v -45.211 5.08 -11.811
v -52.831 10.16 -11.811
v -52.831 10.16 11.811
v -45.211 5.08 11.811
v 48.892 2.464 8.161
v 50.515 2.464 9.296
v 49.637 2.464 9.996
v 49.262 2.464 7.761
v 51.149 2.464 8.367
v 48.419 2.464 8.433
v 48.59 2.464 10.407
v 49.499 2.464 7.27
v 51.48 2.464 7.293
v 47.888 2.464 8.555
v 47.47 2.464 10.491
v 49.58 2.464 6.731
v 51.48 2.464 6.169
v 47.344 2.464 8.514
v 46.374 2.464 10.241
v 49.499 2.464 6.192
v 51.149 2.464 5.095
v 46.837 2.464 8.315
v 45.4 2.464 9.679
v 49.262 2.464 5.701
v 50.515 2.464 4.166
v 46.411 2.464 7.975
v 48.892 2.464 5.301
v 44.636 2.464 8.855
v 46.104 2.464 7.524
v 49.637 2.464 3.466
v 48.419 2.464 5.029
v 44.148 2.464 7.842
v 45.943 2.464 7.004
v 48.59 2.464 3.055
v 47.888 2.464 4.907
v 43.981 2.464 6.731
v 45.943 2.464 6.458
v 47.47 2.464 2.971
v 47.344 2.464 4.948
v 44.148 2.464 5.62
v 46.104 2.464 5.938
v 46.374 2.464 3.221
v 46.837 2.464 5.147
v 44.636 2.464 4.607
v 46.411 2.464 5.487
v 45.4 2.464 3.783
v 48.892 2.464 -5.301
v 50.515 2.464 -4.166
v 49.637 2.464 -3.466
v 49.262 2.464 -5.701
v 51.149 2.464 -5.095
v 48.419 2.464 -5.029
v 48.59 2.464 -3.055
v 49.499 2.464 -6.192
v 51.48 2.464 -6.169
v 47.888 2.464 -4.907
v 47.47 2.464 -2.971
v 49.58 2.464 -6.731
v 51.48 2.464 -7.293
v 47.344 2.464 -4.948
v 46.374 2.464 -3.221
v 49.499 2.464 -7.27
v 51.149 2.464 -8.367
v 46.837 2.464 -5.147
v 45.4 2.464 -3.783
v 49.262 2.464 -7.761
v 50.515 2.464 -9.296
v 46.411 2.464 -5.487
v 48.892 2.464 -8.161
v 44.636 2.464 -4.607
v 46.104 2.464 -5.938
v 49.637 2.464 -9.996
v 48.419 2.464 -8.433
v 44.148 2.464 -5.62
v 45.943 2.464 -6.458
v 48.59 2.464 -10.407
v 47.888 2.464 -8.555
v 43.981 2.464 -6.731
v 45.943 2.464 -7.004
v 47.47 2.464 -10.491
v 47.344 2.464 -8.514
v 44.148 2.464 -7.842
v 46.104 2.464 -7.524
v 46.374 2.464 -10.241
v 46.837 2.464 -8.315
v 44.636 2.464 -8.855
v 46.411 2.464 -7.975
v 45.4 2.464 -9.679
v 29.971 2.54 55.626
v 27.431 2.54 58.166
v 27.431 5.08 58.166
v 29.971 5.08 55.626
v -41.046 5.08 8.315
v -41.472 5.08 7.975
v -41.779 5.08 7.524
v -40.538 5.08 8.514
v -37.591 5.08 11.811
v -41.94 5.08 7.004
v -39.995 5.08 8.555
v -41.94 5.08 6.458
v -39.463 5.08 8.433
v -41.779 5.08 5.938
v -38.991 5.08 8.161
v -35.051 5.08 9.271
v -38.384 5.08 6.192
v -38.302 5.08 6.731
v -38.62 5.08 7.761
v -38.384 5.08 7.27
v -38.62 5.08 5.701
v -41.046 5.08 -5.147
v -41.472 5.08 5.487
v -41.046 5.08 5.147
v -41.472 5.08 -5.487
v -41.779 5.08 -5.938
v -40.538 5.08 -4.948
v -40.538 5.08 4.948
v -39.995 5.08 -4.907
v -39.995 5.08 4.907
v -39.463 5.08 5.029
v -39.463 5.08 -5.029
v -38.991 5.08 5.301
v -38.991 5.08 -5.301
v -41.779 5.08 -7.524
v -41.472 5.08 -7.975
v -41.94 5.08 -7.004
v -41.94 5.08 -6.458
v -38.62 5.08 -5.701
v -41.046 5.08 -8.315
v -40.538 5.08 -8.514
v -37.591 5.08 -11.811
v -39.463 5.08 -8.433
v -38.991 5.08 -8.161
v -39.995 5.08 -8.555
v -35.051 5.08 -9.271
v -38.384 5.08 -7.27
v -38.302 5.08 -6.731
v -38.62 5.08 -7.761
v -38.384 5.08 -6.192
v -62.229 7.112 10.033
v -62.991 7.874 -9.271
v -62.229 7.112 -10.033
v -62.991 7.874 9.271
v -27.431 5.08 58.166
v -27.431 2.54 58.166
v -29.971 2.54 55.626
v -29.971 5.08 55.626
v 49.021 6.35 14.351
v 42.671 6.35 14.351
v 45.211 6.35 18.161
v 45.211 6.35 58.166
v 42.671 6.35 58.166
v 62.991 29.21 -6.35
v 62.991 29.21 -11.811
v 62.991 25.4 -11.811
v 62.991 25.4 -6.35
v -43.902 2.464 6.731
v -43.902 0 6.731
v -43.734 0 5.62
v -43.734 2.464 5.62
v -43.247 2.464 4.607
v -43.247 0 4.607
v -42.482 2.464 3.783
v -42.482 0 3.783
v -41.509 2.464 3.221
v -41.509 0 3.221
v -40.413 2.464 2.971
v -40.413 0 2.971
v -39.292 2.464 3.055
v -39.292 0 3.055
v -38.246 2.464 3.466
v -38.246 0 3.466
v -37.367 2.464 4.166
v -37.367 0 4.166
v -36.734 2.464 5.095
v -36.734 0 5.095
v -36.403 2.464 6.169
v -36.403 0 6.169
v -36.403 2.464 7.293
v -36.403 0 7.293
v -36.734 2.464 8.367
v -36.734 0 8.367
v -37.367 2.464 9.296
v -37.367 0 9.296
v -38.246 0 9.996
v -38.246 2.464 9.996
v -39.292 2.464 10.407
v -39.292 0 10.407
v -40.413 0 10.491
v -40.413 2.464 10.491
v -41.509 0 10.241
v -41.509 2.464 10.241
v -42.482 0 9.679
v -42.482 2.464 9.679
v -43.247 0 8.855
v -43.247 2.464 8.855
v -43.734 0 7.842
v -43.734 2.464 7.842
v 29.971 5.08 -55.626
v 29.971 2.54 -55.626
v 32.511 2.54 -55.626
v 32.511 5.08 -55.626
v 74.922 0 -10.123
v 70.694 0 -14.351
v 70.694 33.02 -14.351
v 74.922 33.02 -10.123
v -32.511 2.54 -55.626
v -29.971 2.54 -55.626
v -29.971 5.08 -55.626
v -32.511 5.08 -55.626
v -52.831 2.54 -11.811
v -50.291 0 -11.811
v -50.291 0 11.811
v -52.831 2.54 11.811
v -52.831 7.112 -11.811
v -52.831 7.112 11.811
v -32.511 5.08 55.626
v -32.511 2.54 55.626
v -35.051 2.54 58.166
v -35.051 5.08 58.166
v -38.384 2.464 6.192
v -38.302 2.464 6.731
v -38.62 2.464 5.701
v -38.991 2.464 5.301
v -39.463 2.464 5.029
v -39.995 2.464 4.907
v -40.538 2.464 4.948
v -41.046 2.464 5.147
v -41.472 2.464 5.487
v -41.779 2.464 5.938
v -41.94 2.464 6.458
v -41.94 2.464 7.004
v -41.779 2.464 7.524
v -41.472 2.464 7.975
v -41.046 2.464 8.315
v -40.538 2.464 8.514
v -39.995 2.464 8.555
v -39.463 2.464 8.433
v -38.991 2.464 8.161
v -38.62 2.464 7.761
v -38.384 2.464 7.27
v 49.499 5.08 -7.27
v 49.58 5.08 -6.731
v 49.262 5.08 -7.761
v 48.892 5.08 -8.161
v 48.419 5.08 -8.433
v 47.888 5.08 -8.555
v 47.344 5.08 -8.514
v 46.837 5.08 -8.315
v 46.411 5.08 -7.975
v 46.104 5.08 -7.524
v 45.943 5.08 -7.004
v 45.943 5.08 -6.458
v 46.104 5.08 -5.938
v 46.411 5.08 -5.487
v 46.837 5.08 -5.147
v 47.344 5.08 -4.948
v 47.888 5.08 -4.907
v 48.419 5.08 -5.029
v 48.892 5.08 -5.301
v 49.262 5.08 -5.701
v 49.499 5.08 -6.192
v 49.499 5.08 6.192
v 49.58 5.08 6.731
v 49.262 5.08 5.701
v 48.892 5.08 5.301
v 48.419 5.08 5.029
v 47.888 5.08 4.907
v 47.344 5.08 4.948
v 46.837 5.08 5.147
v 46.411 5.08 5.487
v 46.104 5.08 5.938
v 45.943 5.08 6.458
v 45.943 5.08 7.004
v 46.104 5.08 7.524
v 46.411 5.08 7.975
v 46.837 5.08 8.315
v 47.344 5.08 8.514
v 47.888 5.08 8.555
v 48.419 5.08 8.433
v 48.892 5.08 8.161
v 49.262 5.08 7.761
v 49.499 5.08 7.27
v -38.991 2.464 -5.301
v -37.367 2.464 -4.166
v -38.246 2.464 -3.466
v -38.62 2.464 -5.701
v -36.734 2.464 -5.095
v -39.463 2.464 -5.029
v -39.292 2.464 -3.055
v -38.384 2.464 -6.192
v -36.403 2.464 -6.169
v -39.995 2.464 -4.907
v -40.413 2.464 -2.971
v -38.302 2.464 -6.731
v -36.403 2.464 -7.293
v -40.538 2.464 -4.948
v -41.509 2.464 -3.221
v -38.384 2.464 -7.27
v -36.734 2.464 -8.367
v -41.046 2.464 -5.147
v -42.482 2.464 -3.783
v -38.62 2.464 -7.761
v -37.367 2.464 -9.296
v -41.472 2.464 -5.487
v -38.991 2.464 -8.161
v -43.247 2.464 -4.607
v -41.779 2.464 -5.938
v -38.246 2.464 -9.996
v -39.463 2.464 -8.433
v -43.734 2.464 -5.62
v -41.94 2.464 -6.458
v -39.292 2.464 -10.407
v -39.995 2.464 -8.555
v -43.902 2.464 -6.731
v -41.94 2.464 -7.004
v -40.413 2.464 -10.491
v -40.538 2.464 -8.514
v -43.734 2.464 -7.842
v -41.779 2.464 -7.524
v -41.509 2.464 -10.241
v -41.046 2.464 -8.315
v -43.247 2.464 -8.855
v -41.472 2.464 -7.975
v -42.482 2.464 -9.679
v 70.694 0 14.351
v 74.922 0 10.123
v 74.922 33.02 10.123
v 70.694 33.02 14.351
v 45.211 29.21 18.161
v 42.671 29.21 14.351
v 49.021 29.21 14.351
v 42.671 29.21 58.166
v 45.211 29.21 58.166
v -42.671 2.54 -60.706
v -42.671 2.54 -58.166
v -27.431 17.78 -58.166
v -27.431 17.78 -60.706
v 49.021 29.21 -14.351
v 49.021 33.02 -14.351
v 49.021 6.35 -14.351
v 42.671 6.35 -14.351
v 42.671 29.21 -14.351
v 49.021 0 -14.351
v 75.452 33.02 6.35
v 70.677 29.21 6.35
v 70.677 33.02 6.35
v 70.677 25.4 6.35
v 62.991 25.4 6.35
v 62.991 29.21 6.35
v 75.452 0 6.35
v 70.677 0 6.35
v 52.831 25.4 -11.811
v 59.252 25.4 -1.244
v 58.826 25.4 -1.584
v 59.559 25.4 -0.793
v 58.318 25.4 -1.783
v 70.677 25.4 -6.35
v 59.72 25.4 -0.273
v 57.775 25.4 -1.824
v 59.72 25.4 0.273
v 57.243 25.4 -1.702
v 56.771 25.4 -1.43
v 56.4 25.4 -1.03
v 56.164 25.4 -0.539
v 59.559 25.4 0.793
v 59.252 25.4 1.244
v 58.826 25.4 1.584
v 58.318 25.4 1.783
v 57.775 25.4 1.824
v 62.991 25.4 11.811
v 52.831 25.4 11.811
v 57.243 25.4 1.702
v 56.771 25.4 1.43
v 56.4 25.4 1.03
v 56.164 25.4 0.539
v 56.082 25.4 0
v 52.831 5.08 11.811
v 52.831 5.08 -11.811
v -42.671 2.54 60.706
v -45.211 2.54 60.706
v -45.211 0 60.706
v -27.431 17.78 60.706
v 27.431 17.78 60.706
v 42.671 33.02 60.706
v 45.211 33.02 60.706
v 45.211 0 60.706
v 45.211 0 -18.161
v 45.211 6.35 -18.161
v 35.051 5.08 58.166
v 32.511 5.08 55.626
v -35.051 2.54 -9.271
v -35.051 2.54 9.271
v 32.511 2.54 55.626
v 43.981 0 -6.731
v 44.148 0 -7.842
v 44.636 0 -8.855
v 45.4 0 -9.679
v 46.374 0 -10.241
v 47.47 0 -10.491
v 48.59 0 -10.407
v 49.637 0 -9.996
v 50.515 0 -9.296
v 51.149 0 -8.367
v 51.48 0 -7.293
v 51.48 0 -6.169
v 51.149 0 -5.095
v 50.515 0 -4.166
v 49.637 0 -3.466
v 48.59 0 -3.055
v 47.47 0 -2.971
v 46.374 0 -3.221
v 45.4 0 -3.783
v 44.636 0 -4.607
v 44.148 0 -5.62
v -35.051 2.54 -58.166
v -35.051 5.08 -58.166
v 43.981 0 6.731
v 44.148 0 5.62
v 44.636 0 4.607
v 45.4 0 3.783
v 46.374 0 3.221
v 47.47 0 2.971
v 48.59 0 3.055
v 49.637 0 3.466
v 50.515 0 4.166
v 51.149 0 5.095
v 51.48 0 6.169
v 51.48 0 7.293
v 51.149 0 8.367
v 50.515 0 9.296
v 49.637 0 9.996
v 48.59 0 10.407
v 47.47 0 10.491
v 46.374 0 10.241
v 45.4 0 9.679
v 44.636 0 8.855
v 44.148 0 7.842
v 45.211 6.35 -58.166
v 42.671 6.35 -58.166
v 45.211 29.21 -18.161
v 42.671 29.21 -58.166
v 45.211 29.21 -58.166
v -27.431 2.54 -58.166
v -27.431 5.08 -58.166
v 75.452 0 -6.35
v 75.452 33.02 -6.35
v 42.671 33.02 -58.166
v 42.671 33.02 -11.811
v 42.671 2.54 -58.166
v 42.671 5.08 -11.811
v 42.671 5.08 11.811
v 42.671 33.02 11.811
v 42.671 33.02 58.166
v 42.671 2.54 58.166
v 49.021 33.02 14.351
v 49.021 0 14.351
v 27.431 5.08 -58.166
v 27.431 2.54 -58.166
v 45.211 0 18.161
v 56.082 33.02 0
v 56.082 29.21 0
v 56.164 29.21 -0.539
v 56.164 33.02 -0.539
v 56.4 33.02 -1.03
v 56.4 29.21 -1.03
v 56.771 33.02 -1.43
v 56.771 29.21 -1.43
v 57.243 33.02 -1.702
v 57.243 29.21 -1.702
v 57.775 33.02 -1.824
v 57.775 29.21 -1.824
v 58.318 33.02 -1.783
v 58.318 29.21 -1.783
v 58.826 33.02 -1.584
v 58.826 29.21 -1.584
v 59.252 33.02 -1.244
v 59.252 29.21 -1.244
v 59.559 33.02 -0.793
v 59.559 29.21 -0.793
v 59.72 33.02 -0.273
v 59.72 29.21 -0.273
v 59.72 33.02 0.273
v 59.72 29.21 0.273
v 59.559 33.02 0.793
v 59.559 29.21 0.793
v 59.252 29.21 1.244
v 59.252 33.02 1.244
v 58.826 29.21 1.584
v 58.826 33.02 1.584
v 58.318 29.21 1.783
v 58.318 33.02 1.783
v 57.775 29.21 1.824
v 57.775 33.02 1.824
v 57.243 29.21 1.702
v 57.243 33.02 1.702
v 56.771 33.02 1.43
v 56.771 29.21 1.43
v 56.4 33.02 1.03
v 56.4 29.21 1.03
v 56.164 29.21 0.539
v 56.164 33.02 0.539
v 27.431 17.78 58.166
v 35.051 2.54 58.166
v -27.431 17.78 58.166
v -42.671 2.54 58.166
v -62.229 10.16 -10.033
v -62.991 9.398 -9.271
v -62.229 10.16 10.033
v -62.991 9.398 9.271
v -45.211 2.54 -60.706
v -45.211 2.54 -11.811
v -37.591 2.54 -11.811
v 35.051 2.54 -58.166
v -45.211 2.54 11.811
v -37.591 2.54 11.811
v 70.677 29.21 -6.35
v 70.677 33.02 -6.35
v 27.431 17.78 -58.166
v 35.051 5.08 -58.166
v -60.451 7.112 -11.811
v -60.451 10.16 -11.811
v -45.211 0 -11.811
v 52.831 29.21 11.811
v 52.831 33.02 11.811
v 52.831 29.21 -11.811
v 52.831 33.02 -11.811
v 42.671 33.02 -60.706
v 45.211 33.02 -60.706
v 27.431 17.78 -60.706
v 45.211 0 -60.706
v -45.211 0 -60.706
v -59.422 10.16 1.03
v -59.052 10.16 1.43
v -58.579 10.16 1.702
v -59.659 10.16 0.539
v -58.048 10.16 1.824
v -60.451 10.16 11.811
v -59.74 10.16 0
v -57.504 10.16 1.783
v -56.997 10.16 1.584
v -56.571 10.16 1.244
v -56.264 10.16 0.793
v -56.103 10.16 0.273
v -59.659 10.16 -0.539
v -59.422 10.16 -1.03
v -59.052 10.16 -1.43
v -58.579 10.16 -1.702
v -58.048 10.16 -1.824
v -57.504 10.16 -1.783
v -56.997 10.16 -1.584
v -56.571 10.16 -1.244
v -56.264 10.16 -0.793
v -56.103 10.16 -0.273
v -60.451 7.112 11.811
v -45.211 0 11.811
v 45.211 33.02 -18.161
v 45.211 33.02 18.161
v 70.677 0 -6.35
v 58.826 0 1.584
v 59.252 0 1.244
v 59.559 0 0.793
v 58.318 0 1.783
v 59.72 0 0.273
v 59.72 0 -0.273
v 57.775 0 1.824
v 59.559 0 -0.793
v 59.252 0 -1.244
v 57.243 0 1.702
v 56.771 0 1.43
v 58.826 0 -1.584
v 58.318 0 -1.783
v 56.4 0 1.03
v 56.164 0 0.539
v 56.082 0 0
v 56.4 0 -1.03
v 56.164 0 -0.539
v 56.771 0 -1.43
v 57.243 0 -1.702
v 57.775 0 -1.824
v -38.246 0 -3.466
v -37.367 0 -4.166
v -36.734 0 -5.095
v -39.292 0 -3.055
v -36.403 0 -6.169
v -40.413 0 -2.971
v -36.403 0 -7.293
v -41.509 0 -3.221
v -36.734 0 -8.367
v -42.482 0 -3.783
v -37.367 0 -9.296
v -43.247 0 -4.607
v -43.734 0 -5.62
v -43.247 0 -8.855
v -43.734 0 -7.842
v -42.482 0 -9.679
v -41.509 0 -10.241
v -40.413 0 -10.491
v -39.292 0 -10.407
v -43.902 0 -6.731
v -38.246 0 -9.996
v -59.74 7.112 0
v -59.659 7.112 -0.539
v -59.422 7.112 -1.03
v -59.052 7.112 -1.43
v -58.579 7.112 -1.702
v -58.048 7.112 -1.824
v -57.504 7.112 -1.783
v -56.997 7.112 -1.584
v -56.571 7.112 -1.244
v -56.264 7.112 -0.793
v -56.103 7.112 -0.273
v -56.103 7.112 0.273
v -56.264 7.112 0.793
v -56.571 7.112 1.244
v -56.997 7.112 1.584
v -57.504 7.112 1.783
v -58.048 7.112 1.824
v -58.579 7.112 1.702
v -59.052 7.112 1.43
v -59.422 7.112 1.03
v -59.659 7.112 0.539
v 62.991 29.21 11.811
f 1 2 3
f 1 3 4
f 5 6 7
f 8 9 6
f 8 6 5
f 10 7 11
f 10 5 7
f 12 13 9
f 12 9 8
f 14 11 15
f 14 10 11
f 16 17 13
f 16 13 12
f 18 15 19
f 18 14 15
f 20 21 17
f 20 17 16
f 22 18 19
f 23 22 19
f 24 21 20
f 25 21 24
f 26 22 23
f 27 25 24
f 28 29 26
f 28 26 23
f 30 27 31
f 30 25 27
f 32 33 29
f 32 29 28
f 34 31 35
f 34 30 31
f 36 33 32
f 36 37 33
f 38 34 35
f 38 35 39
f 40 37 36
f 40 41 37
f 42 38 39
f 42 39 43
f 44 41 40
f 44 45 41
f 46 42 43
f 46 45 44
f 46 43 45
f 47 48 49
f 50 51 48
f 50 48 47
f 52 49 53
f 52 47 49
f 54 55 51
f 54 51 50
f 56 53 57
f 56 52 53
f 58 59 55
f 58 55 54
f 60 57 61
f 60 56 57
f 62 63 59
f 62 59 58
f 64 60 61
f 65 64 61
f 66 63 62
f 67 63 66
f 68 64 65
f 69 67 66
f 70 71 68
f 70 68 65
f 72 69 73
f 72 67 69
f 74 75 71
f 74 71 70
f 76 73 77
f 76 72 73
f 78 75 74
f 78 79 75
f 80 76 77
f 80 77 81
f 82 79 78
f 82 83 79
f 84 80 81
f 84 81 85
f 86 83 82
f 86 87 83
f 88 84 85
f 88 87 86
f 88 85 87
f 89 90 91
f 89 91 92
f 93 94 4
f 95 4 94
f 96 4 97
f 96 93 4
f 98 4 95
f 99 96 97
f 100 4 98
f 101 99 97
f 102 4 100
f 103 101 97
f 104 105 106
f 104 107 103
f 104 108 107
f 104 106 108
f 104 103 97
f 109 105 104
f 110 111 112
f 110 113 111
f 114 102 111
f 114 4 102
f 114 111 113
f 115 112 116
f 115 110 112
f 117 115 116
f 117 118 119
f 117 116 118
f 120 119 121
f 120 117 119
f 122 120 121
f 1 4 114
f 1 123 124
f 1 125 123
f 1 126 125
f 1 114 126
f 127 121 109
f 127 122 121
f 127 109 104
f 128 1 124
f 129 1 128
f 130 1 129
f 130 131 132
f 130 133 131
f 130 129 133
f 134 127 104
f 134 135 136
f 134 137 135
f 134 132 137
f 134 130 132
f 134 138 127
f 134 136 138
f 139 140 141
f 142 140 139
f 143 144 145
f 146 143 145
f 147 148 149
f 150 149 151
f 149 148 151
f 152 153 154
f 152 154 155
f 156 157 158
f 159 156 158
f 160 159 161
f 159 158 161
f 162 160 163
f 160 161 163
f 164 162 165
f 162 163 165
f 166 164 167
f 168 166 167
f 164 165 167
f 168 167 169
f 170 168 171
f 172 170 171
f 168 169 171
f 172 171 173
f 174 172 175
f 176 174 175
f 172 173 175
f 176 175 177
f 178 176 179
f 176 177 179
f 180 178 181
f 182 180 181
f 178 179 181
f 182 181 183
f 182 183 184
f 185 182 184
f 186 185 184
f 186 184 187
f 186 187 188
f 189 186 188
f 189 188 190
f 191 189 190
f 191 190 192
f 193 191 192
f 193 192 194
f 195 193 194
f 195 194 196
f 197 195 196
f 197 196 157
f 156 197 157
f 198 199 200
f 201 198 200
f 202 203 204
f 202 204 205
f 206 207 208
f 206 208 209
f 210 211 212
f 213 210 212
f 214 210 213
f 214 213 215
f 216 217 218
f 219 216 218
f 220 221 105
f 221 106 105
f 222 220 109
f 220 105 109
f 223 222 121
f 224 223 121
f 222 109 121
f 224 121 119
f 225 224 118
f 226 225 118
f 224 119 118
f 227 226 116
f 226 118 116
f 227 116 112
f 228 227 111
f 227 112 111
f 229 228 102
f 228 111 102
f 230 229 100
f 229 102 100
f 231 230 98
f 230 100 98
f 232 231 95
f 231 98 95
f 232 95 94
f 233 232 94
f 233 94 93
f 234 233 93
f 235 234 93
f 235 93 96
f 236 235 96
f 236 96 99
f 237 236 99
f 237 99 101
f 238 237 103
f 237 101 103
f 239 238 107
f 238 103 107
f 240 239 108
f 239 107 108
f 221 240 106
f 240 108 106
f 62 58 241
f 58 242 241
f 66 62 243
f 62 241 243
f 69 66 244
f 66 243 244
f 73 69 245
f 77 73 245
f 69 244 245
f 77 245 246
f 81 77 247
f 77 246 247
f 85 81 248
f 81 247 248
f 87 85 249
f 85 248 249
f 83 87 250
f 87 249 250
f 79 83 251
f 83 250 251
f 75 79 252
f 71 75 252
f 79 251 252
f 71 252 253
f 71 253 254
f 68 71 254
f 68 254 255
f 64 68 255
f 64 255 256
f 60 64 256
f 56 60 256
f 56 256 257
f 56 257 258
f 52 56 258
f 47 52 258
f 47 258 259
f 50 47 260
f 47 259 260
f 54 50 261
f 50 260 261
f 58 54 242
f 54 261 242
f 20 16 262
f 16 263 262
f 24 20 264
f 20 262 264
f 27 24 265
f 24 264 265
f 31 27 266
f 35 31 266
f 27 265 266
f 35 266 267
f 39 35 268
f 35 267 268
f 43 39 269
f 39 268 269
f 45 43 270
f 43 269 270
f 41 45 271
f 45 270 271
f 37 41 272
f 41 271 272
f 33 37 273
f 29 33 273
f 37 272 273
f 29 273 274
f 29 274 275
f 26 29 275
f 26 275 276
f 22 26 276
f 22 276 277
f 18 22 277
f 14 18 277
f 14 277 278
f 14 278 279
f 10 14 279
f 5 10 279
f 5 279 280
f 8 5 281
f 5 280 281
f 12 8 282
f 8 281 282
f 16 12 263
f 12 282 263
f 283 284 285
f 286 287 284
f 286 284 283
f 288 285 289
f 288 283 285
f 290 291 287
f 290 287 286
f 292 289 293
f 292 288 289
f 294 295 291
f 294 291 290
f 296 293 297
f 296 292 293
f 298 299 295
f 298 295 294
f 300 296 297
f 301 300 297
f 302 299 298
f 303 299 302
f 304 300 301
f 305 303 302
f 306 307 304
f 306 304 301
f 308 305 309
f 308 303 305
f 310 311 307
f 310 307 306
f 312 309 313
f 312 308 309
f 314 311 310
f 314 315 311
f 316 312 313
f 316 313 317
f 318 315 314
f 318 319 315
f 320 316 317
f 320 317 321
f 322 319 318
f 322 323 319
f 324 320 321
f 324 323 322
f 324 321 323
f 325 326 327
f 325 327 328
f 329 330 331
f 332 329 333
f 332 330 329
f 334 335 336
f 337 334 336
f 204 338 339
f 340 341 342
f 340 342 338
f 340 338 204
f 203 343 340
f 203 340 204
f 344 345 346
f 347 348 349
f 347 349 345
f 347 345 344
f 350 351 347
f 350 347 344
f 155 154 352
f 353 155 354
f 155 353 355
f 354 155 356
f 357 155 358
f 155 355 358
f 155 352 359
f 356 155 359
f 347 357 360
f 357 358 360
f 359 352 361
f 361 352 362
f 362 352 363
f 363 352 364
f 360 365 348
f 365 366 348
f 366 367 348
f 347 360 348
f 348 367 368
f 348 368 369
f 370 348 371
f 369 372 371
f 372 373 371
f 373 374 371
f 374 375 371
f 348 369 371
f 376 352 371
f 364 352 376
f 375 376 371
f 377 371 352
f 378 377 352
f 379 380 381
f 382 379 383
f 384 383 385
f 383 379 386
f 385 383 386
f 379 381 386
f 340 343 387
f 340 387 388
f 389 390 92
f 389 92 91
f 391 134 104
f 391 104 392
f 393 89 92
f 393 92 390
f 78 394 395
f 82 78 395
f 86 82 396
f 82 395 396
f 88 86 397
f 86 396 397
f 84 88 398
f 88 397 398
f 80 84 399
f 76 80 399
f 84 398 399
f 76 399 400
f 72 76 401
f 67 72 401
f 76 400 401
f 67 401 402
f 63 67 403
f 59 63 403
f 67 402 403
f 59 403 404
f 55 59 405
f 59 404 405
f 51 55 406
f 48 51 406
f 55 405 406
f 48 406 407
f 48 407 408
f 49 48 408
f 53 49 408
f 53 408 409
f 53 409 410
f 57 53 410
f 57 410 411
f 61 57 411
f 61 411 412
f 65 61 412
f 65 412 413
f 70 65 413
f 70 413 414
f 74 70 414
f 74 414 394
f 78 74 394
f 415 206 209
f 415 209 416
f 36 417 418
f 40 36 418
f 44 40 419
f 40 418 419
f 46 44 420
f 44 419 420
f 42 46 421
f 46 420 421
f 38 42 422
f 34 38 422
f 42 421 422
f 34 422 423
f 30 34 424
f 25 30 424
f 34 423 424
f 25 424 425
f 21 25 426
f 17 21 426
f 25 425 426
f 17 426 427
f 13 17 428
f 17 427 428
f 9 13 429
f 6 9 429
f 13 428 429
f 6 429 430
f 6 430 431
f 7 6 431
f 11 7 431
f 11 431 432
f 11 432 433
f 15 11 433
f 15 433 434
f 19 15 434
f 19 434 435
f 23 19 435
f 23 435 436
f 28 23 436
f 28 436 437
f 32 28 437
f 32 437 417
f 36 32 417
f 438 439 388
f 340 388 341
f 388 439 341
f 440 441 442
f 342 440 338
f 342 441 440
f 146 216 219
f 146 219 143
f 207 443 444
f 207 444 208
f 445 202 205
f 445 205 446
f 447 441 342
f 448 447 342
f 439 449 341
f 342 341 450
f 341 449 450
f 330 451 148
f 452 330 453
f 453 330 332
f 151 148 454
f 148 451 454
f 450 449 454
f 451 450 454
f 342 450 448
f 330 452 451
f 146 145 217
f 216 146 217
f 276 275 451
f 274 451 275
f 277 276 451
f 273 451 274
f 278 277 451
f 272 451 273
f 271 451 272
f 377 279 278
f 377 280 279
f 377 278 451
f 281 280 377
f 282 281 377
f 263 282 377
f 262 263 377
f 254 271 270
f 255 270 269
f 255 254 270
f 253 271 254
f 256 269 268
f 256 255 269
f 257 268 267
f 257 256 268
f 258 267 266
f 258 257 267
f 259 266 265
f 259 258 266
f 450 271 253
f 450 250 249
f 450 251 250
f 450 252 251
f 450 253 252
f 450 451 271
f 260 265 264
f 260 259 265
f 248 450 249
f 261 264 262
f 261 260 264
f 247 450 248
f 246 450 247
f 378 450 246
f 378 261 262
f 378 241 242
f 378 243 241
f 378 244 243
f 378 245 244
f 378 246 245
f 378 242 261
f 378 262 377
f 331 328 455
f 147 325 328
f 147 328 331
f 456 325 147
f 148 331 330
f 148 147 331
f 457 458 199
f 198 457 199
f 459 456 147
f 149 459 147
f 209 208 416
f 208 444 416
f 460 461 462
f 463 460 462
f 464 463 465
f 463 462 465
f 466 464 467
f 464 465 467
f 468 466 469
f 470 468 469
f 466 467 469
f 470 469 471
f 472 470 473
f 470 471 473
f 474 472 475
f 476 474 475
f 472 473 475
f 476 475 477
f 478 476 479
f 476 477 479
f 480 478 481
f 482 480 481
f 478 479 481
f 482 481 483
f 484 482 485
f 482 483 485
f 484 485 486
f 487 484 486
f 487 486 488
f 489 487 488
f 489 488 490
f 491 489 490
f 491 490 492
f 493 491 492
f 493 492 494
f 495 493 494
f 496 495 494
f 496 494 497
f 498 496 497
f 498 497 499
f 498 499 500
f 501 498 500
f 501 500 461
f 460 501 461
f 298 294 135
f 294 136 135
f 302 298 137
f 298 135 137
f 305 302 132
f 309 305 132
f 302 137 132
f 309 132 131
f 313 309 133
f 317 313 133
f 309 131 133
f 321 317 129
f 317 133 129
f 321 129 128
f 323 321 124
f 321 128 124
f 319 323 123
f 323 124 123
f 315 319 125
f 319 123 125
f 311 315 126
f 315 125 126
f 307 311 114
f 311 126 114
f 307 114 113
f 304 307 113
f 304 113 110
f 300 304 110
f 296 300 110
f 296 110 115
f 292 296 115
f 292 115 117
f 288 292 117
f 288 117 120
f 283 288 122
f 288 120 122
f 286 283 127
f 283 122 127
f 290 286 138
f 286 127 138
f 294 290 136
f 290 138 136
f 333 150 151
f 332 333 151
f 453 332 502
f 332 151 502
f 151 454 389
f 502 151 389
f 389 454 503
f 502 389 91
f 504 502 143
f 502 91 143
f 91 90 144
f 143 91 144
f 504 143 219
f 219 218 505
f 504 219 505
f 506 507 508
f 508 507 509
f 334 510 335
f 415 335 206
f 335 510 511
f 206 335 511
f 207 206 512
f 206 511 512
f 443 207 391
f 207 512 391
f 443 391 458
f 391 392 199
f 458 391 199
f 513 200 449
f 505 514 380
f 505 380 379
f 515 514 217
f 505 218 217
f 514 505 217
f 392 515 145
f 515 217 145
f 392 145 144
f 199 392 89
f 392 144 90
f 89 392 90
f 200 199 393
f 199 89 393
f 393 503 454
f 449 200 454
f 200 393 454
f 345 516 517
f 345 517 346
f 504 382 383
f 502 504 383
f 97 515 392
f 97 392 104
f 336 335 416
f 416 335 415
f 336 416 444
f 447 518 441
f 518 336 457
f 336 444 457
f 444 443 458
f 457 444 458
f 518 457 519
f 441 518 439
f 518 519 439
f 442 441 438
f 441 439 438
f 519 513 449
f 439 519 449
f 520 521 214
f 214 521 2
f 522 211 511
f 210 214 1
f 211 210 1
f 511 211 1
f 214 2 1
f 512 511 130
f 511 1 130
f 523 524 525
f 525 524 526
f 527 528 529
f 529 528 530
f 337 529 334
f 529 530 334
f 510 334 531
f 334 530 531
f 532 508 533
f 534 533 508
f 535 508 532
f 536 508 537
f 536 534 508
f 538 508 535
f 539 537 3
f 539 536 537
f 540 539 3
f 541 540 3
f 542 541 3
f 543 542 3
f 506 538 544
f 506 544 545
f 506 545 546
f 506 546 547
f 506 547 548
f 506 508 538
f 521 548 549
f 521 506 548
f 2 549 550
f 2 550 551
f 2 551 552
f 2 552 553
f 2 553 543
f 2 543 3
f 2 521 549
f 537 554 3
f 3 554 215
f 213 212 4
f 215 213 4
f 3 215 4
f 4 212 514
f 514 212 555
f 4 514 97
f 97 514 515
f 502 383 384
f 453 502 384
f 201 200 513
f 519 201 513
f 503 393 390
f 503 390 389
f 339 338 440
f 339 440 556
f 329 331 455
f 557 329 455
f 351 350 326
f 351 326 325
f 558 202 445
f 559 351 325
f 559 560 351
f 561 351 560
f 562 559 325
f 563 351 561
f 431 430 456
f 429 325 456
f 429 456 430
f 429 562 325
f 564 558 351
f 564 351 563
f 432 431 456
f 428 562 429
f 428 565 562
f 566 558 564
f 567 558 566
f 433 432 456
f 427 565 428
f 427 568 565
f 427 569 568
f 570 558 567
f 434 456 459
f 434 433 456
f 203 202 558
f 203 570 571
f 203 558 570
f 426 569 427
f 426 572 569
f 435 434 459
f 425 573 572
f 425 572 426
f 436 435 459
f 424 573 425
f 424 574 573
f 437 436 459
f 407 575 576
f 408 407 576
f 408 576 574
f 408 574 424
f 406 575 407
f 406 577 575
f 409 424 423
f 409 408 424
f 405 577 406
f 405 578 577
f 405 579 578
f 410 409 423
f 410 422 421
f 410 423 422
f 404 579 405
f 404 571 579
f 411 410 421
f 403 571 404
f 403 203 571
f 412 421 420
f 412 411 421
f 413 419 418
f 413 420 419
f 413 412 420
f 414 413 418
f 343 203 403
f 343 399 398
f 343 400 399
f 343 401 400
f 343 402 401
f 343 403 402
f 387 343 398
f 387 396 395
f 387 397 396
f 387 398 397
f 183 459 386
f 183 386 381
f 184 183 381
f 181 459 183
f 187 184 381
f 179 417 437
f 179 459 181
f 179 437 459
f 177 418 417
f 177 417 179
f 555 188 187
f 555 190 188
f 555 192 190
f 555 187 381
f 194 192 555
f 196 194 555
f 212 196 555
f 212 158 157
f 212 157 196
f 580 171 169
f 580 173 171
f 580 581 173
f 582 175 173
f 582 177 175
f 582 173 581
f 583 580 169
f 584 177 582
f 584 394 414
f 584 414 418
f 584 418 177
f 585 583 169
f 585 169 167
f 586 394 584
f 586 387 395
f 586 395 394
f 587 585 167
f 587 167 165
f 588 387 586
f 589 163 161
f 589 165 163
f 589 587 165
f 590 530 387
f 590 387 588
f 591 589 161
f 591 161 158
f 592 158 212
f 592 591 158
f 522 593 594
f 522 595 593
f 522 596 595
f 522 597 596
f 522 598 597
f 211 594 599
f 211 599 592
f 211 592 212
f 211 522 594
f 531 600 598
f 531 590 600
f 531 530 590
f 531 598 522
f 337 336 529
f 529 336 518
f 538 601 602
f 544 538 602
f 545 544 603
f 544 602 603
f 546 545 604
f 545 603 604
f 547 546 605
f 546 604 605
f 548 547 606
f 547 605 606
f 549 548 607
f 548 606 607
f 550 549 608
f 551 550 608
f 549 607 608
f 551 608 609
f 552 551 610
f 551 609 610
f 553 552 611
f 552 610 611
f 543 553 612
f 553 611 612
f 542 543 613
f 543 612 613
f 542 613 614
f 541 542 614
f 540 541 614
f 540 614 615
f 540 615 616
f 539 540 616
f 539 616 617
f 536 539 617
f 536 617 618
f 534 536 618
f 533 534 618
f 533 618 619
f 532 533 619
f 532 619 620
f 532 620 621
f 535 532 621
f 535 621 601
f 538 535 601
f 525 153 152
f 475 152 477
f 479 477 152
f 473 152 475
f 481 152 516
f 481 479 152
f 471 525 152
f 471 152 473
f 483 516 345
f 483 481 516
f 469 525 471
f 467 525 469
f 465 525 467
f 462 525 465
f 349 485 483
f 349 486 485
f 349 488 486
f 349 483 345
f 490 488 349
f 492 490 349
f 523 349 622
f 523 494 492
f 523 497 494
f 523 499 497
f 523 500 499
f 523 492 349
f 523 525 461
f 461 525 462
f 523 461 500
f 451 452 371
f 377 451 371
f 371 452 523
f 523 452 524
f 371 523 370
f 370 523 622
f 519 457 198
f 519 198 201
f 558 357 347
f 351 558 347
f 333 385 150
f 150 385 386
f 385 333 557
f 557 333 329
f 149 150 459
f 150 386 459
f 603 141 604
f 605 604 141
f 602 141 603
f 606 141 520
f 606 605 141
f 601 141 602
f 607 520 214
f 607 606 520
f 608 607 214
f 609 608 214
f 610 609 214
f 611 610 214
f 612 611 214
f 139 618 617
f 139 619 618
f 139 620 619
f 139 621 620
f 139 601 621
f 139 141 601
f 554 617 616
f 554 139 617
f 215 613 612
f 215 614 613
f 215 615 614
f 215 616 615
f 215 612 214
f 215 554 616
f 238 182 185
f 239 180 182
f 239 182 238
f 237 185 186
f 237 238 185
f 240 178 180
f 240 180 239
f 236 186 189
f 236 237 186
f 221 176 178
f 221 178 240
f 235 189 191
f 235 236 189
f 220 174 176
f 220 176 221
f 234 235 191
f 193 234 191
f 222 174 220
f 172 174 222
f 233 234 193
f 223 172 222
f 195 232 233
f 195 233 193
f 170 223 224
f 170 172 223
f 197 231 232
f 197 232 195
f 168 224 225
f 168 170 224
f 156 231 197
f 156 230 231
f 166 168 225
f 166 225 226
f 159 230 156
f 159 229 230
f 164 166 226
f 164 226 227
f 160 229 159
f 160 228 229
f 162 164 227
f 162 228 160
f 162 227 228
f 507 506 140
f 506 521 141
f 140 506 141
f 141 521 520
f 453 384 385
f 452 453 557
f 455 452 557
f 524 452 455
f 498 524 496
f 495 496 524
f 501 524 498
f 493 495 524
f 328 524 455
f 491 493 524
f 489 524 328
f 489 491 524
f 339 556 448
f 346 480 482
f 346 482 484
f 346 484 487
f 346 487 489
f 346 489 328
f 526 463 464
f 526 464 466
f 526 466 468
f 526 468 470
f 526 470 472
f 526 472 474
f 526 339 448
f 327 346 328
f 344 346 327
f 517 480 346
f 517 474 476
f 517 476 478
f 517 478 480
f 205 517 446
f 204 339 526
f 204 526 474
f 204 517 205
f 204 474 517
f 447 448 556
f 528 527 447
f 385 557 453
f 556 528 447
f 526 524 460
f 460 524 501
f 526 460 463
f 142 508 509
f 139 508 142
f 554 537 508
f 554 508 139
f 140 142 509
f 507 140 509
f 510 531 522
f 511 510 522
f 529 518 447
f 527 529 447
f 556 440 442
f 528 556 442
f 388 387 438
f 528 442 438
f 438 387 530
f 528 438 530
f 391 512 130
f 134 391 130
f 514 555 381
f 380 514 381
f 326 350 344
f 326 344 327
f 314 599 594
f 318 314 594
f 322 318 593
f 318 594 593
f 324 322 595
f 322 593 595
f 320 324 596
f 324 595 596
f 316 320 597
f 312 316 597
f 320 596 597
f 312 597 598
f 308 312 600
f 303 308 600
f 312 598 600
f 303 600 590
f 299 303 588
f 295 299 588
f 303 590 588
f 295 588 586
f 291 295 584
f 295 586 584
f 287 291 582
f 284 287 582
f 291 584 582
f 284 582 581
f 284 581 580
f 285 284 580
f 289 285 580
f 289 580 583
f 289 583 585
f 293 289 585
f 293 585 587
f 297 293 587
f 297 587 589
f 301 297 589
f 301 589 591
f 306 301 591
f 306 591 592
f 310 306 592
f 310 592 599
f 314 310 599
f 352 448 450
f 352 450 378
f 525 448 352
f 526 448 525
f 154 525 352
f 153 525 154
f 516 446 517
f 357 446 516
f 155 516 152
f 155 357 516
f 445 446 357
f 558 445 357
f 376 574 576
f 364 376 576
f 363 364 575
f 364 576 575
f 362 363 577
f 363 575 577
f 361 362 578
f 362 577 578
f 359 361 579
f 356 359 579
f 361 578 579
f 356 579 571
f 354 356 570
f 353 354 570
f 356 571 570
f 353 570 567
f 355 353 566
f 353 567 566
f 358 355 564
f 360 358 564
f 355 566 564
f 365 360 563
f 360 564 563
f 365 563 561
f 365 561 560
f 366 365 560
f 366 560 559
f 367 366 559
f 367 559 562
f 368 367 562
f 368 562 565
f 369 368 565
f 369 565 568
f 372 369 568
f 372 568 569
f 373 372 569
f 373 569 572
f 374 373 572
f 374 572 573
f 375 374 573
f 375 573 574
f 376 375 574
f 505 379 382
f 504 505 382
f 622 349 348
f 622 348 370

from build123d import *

# Parameters (mm, degrees)
SKETCH3_W                                       = 90.422573022
SKETCH3_H                                       = 121.412
BOSS_EXTRUDE4_DEPTH                             = 2.54
BOSS_EXTRUDE5_DEPTH                             = 30.48
CUT_EXTRUDE2_DEPTH                              = 122.412
BOSS_EXTRUDE6_DEPTH                             = 33.02
SKETCH9_W                                       = 10.16
SKETCH9_H                                       = 23.622
CUT_EXTRUDE3_DEPTH                              = 27.94
BOSS_EXTRUDE7_DEPTH                             = 2.54
SKETCH12_W                                      = 23.622
SKETCH12_H                                      = 3.81
CUT_EXTRUDE4_DEPTH                              = 10.16
SKETCH13_W                                      = 12.7
SKETCH13_H                                      = 3.81
CUT_EXTRUDE5_DEPTH                              = 13.461069207
BOSS_EXTRUDE9_REACH                             = 62.706
BOSS_EXTRUDE9_DIRECTION_2_REACH                 = 62.706
CBORE_FOR_6_PAN_HEAD_MACHINE_SCREW1_D           = 3.6576
CBORE_FOR_6_PAN_HEAD_MACHINE_SCREW1_CBORE_D     = 7.54126
CBORE_FOR_6_PAN_HEAD_MACHINE_SCREW1_CBORE_DEPTH = 2.4638
F_6_CLEARANCE_HOLE1_D                           = 3.6576
SKETCH21_W                                      = 43.815
SKETCH21_H                                      = 22.86
CUT_EXTRUDE6_DEPTH                              = 33.781069207
CHAMFER1_SIZE                                   = 2.54
CHAMFER2_SIZE                                   = 3.81
SKETCH23_W                                      = 10.16
SKETCH23_H                                      = 23.622
CUT_EXTRUDE8_DEPTH                              = 0.762
CHAMFER3_SIZE                                   = 0.762


with BuildPart() as part:
    # Sketch3 → Boss-Extrude4 (new body)
    with BuildSketch(Plane(origin=(0, 0, 0), x_dir=(1, 0, 0), z_dir=(0, 1, 0))):
        Rectangle(SKETCH3_W, SKETCH3_H)
    extrude(amount=BOSS_EXTRUDE4_DEPTH)

    # Sketch6 → Boss-Extrude5 (add)
    with BuildSketch(Plane(origin=(0, 2.54, 0), x_dir=(1, 0, 0), z_dir=(0, 1, 0))):
        Polygon((45.211286511, -60.706), (45.211286511, 60.706), (-45.211286511, 60.706), (-45.211286511, 58.166), (42.671286511, 58.166), (42.671286511, -58.166), (-45.211286511, -58.166), (-45.211286511, -60.706), align=None)
    extrude(amount=BOSS_EXTRUDE5_DEPTH)

    # Sketch7 → Cut-Extrude2 (cut, through all)
    with BuildSketch(Plane.XY.offset(60.706)):
        Polygon((-42.671286511, 2.54), (-27.431286511, 17.78), (27.431286511, 17.78), (42.671286511, 33.02), (-45.211286511, 33.02), (-45.211286511, 2.54), align=None)
    extrude(amount=-CUT_EXTRUDE2_DEPTH, mode=Mode.SUBTRACT)

    # Sketch8 → Boss-Extrude6 (add)
    with BuildSketch(Plane(origin=(0, 0, 0), x_dir=(1, 0, 0), z_dir=(0, 1, 0))):
        Polygon((45.211286511, 14.351), (70.694027546, 14.351), (74.922106204, 10.122921342), (75.452355719, 6.35), (70.677155719, 6.35), (70.677155719, -6.35), (75.452355719, -6.35), (74.922106204, -10.122921342), (70.694027546, -14.351), (45.211286511, -14.351), align=None)
    extrude(amount=BOSS_EXTRUDE6_DEPTH)

    # Sketch9 → Cut-Extrude3 (cut)
    with BuildSketch(Plane(origin=(0, 33.02, 0), x_dir=(1, 0, 0), z_dir=(0, 1, 0))):
        with Locations((47.751286511, 0)):
            Rectangle(SKETCH9_W, SKETCH9_H)
    extrude(amount=-CUT_EXTRUDE3_DEPTH, mode=Mode.SUBTRACT)

    # Sketch11 → Boss-Extrude7 (add)
    with BuildSketch(Plane(origin=(0, 2.54, 0), x_dir=(1, 0, 0), z_dir=(0, 1, 0))):
        Polygon((35.051286511, 58.166), (27.431286511, 58.166), (29.971286511, 55.626), (32.511286511, 55.626), align=None)
        Polygon((-29.971286511, 55.626), (-32.511286511, 55.626), (-35.051286511, 58.166), (-27.431286511, 58.166), align=None)
        Polygon((29.971286511, -55.626), (32.511286511, -55.626), (35.051286511, -58.166), (27.431286511, -58.166), align=None)
        Polygon((-27.431286511, -58.166), (-29.971286511, -55.626), (-32.511286511, -55.626), (-35.051286511, -58.166), align=None)
    extrude(amount=BOSS_EXTRUDE7_DEPTH)

    # Sketch12 → Cut-Extrude4 (cut)
    with BuildSketch(Plane.ZY.offset(-52.831286511)):
        with Locations((0, 27.305)):
            Rectangle(SKETCH12_W, SKETCH12_H)
    extrude(amount=-CUT_EXTRUDE4_DEPTH, mode=Mode.SUBTRACT)

    # Sketch13 → Cut-Extrude5 (cut, through all)
    with BuildSketch(Plane.ZY.offset(-62.991286511)):
        with Locations((0, 27.305)):
            Rectangle(SKETCH13_W, SKETCH13_H)
    extrude(amount=-CUT_EXTRUDE5_DEPTH, mode=Mode.SUBTRACT)

    # Boss-Extrude9: up to this face of the body (flat: up to its plane)
    boss_extrude9_end = Plane(part.part.faces().sort_by_distance((48.970486511, 20.0406, -11.811))[0])
    # Sketch15 → Boss-Extrude9 (add, up to the picked face)
    with BuildSketch(Plane.XY, mode=Mode.PRIVATE) as boss_extrude9_sk1:
        Polygon((-62.991286511, 10.16), (-52.831286511, 10.16), (-45.211286511, 5.08), (-35.051286511, 5.08), (-35.051286511, 2.54), (-45.211286511, 2.54), (-45.211286511, 0), (-52.831286511, 0), (-52.831286511, 6.35), (-62.991286511, 6.35), align=None)
    boss_extrude9_tool1 = split(extrude(boss_extrude9_sk1.sketch, amount=-BOSS_EXTRUDE9_REACH, mode=Mode.PRIVATE), bisect_by=boss_extrude9_end, keep=Keep.BOTH, mode=Mode.PRIVATE)
    add(boss_extrude9_tool1.solids().sort_by_distance((-50.157602, 5.280526, 0))[0])

    # Boss-Extrude9 direction 2: up to this face of the body (flat: up to its plane)
    boss_extrude9_direction_2_end = Plane(part.part.faces().sort_by_distance((48.970486511, 20.0406, 11.811))[0])
    # Sketch15 → Boss-Extrude9 direction 2 (add, up to the picked face)
    with BuildSketch(Plane.XY, mode=Mode.PRIVATE) as boss_extrude9_direction_2_sk1:
        Polygon((-62.991286511, 10.16), (-52.831286511, 10.16), (-45.211286511, 5.08), (-35.051286511, 5.08), (-35.051286511, 2.54), (-45.211286511, 2.54), (-45.211286511, 0), (-52.831286511, 0), (-52.831286511, 6.35), (-62.991286511, 6.35), align=None)
    boss_extrude9_direction_2_tool1 = split(extrude(boss_extrude9_direction_2_sk1.sketch, amount=BOSS_EXTRUDE9_DIRECTION_2_REACH, mode=Mode.PRIVATE), bisect_by=boss_extrude9_direction_2_end, keep=Keep.BOTH, mode=Mode.PRIVATE)
    add(boss_extrude9_direction_2_tool1.solids().sort_by_distance((-50.157602, 5.280526, 0))[0])

    # CBORE for #6 Pan Head Machine Screw1 (through all)
    with Locations(Plane(origin=(0, 0, 0), x_dir=(-1, 0, 0), z_dir=(0, -1, 0))):
        with Locations((-47.751286511, 6.731), (-47.751286511, -6.731), (40.131286511, 6.731), (40.131286511, -6.731)):
            CounterBoreHole(CBORE_FOR_6_PAN_HEAD_MACHINE_SCREW1_D / 2, CBORE_FOR_6_PAN_HEAD_MACHINE_SCREW1_CBORE_D / 2, CBORE_FOR_6_PAN_HEAD_MACHINE_SCREW1_CBORE_DEPTH)

    # #6 Clearance Hole1 (through all)
    with Locations(Plane(origin=(0, 33.02, 0), x_dir=(1, 0, 0), z_dir=(0, 1, 0))):
        with Locations((-57.911286511, 0), (57.911286511, 0)):
            Hole(F_6_CLEARANCE_HOLE1_D / 2)

    # Sketch21 → Cut-Extrude6 (cut, through all)
    with BuildSketch(Plane.ZY.offset(-42.671286511)):
        with Locations((-36.2585, 17.78)):
            Rectangle(SKETCH21_W, SKETCH21_H)
        with Locations((36.2585, 17.78)):
            Rectangle(SKETCH21_W, SKETCH21_H)
    extrude(amount=-CUT_EXTRUDE6_DEPTH, mode=Mode.SUBTRACT)

    # Chamfer1
    chamfer1_edges = [part.edges().sort_by_distance(p)[0] for p in [
        (-52.831286511, 0, 0),
        (-35.051286511, 3.81, -11.811),
        (-62.991286511, 8.255, -11.811),
        (-62.991286511, 8.255, 11.811),
        (-35.051286511, 3.81, 11.811),
    ]]
    chamfer(chamfer1_edges, length=CHAMFER1_SIZE)

    # Chamfer2
    chamfer2_edges = [part.edges().sort_by_distance(p)[0] for p in [
        (45.211286511, 3.175, -14.351),
        (45.211286511, 3.175, 14.351),
        (45.211286511, 31.115, -14.351),
        (45.211286511, 31.115, 14.351),
    ]]
    chamfer(chamfer2_edges, length=CHAMFER2_SIZE)

    # Sketch23 → Cut-Extrude8 (cut)
    with BuildSketch(Plane.XZ.offset(-6.35)):
        with Locations((-57.911286511, 0)):
            Rectangle(SKETCH23_W, SKETCH23_H)
    extrude(amount=-CUT_EXTRUDE8_DEPTH, mode=Mode.SUBTRACT)

    # Chamfer3
    chamfer3_edges = [part.edges().sort_by_distance(p)[0] for p in [
        (-62.991286511, 10.16, 0),
        (-62.991286511, 7.112, 0),
    ]]
    chamfer(chamfer3_edges, length=CHAMFER3_SIZE)


solid = part.part
